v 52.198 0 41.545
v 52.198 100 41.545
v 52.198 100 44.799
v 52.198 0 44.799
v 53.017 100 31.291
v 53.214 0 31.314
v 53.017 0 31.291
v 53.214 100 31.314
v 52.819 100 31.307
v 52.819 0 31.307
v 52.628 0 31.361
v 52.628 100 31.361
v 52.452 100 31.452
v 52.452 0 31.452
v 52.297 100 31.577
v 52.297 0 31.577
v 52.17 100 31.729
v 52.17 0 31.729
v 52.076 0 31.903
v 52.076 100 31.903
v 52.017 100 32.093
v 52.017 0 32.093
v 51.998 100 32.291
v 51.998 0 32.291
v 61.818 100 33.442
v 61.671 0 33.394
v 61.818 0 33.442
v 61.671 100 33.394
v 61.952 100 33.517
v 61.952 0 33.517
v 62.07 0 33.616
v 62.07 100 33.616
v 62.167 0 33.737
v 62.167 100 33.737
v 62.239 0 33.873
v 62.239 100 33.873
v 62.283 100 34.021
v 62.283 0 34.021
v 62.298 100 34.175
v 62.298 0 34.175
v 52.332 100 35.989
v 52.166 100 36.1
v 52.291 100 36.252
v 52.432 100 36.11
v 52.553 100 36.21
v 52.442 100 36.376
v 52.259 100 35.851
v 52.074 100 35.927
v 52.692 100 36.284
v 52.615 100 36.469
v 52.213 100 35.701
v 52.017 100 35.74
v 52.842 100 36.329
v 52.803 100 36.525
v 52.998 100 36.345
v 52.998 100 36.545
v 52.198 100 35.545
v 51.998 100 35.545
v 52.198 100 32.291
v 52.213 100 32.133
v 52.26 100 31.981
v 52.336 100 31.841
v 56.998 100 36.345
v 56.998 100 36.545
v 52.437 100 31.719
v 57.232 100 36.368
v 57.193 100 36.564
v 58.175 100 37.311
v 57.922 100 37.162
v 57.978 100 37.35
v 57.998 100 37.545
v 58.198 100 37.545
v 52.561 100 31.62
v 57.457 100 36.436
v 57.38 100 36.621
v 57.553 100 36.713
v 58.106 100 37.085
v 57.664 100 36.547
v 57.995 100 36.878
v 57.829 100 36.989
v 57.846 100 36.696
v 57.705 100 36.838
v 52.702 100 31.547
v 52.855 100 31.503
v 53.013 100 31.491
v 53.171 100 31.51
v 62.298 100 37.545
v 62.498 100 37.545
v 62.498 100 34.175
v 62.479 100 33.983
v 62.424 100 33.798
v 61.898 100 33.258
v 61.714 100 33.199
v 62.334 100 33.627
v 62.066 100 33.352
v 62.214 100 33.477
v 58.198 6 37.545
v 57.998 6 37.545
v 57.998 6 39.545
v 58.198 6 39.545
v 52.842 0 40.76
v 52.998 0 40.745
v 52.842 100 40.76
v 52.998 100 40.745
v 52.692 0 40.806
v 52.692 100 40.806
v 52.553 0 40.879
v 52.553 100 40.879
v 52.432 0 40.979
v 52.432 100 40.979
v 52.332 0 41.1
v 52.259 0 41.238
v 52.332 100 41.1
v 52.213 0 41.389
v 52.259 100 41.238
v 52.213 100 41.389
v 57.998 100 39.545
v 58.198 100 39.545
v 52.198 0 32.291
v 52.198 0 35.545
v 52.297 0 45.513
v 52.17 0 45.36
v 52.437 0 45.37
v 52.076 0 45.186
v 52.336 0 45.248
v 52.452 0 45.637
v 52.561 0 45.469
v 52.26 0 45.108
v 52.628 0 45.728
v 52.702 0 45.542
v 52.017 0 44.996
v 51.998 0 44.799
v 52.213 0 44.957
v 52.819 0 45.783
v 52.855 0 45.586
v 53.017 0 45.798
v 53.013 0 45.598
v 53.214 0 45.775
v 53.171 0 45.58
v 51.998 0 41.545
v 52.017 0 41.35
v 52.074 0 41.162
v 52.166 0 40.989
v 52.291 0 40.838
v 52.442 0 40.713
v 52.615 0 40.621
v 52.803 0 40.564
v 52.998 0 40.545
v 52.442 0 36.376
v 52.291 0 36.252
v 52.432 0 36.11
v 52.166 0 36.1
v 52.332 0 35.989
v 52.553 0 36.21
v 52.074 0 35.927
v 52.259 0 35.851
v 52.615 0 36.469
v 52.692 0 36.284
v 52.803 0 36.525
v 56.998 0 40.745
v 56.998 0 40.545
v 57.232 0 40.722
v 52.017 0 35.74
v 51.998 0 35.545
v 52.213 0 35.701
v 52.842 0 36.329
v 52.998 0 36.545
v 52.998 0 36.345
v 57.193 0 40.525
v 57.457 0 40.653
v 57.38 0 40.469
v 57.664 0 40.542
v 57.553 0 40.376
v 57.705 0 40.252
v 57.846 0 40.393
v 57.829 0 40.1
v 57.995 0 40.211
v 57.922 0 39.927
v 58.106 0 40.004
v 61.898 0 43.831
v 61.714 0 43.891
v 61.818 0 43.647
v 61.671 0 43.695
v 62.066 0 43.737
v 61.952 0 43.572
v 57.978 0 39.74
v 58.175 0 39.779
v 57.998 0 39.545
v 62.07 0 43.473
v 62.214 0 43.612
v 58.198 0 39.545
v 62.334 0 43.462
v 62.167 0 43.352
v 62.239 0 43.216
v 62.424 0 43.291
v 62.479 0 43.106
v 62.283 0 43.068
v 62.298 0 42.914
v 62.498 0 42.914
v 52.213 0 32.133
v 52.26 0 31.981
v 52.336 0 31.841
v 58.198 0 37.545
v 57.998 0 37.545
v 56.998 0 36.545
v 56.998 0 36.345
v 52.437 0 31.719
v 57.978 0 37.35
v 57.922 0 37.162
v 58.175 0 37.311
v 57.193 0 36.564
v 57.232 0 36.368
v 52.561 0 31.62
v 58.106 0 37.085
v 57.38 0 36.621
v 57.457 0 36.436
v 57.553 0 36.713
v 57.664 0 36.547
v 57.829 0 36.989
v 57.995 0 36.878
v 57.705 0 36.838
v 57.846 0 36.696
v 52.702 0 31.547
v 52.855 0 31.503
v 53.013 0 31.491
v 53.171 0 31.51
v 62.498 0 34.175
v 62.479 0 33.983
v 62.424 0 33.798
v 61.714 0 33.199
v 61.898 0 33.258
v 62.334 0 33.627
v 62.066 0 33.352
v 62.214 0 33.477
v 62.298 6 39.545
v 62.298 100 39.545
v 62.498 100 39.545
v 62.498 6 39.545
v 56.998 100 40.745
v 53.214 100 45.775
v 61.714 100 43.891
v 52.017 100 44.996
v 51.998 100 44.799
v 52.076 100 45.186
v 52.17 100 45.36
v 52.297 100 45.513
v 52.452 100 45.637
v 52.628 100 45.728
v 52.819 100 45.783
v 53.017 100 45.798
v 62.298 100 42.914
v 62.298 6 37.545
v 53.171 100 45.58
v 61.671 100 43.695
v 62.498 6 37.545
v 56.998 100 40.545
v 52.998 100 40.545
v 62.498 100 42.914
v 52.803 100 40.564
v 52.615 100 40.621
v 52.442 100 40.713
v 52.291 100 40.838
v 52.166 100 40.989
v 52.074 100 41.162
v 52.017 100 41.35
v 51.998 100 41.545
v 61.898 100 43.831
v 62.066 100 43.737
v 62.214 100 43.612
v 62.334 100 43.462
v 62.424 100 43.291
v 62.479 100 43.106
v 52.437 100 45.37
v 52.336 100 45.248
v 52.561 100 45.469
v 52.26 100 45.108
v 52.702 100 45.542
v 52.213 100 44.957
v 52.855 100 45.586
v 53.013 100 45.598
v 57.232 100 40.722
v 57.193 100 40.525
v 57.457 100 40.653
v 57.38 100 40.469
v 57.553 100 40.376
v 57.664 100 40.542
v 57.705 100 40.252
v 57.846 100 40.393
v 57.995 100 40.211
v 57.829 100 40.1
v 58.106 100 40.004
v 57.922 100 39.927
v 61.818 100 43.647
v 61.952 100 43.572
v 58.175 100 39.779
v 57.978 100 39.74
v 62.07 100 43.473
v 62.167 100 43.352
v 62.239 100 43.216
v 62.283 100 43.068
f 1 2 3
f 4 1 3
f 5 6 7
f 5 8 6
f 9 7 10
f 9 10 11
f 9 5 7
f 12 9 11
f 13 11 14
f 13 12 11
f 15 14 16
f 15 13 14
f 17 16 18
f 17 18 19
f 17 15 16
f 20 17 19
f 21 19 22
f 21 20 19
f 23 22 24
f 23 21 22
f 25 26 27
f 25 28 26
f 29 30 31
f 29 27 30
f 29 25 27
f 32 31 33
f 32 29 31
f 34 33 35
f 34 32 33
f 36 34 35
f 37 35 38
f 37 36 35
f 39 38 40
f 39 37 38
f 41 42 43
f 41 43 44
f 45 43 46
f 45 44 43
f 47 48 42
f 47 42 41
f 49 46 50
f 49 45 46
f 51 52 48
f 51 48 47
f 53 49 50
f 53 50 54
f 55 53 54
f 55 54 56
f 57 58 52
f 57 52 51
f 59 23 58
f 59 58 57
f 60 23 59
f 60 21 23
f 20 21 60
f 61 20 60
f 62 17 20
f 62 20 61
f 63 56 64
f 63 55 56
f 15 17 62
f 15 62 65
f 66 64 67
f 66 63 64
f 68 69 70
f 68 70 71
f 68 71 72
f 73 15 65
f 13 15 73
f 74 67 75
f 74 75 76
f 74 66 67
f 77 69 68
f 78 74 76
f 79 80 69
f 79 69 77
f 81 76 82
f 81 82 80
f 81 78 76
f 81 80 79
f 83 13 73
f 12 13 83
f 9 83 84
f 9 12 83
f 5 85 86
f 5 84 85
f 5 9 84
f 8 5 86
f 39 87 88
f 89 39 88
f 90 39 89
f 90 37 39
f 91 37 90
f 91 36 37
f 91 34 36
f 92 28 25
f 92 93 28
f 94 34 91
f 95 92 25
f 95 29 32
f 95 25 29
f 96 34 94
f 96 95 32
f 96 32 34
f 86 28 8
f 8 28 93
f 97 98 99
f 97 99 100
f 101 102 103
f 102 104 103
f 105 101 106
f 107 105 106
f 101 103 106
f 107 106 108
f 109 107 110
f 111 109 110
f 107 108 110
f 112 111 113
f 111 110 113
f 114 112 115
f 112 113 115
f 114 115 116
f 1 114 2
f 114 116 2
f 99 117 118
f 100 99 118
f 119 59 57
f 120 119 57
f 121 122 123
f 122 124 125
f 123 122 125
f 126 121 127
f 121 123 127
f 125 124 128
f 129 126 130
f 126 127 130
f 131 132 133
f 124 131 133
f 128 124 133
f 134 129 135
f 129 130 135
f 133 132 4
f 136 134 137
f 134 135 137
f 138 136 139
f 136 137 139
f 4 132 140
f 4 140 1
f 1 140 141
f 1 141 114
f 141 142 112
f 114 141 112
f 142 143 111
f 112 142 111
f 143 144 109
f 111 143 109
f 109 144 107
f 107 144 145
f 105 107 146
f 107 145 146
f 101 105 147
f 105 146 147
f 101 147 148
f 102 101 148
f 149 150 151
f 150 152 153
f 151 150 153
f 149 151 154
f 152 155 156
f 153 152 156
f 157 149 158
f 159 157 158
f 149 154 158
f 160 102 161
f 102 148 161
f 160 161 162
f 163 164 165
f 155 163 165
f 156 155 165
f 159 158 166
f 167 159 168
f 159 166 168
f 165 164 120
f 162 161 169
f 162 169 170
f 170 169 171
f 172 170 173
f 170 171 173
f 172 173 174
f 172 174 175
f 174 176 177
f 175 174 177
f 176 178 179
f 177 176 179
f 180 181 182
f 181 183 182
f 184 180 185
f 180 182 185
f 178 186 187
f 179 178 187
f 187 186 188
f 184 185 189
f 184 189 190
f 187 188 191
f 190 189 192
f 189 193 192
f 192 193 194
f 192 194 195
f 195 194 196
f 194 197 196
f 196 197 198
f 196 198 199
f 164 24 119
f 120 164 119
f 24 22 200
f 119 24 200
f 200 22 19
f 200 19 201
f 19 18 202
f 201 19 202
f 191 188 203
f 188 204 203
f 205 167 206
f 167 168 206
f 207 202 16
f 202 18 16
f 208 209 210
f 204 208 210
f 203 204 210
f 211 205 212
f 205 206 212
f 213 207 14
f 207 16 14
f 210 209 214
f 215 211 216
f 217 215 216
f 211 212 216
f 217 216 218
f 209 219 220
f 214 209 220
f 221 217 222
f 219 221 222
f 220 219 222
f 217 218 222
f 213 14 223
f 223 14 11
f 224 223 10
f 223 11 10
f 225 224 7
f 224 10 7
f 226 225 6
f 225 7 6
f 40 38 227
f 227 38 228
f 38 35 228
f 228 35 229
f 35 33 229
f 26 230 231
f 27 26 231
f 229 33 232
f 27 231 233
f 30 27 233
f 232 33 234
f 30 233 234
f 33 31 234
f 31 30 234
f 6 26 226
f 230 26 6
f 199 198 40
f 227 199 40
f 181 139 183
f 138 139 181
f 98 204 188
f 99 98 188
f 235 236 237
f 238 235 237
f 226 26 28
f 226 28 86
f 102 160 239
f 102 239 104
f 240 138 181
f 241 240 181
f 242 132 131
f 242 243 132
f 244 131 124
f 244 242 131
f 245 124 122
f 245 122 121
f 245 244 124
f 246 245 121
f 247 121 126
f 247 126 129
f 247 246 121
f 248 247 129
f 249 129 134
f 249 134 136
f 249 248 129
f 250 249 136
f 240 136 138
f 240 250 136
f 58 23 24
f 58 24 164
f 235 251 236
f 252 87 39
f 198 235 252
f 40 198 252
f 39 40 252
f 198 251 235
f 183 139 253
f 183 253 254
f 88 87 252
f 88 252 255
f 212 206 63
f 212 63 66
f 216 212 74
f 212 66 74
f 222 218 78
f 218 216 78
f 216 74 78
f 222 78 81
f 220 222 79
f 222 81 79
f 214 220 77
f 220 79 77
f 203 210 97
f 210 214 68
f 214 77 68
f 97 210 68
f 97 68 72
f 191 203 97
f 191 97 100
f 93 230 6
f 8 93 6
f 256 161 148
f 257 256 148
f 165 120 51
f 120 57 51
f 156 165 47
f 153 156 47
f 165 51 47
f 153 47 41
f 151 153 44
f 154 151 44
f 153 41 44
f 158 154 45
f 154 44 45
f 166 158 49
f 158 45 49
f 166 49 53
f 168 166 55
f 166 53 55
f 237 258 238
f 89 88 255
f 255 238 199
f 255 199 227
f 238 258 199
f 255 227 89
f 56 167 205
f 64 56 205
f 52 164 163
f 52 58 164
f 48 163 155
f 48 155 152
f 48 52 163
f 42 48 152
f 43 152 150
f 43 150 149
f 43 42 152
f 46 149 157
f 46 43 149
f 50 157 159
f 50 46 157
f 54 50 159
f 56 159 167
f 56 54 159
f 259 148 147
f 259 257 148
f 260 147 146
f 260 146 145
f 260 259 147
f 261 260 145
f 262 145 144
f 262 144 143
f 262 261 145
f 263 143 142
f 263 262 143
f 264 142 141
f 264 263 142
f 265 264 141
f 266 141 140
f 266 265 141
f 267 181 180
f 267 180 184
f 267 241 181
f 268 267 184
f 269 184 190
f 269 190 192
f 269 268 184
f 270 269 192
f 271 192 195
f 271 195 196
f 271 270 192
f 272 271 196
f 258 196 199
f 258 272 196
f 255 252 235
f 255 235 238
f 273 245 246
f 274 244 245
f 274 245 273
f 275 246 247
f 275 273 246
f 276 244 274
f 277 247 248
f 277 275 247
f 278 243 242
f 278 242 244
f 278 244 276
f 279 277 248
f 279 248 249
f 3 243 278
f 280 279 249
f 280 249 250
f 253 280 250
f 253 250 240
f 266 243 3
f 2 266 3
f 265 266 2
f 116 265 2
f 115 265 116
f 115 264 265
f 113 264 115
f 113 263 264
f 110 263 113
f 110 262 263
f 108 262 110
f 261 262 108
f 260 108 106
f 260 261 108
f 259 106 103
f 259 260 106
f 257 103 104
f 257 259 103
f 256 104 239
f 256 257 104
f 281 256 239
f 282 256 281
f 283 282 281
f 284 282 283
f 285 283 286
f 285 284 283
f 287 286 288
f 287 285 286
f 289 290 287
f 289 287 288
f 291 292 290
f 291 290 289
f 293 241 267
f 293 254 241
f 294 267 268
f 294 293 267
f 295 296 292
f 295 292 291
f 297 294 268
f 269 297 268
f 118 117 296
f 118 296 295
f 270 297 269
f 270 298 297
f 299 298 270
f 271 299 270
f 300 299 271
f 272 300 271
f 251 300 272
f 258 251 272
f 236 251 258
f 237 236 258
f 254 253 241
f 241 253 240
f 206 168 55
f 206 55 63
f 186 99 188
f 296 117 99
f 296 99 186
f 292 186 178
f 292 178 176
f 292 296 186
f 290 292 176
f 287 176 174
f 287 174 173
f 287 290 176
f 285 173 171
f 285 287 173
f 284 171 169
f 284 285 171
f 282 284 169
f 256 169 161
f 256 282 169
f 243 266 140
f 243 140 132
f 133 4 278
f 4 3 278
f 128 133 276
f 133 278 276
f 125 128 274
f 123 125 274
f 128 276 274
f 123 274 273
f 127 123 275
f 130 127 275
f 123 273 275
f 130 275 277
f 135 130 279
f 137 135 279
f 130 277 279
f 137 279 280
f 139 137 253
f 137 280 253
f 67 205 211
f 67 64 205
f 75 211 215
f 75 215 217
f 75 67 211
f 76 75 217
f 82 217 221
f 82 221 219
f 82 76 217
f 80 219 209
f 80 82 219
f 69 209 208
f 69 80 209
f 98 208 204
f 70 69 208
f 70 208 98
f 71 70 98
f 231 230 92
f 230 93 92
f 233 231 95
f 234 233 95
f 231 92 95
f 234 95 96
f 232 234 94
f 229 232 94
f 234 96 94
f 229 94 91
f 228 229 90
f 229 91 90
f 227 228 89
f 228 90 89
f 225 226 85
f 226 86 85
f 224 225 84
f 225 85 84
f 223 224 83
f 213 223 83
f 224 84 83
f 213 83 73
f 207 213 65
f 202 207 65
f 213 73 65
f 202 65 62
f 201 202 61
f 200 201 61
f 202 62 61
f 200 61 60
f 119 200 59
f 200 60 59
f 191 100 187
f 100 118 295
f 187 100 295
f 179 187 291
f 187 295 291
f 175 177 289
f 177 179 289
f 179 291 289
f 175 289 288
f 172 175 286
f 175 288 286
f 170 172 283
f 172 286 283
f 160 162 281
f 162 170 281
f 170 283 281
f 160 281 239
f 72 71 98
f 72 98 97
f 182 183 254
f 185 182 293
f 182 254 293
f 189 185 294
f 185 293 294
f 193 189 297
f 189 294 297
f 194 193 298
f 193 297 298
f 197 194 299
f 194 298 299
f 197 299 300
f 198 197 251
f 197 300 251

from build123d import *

# Parameters (mm, degrees)
BOSS_EXTRUDE1_DEPTH = 100
FILLET1_R           = 1
SHELL3_T            = -0.2
SKETCH2_W           = 5.995745437
SKETCH2_H           = 2
CUT_EXTRUDE1_DEPTH  = 94


with BuildPart() as part:
    # Sketch1 → Boss-Extrude1 (new body)
    with BuildSketch(Plane(origin=(0, 0, 0), x_dir=(1, 0, 0), z_dir=(0, 1, 0))):
        Polygon((62.497660956, -33.372417048), (51.997660956, -31.04462309), (51.997660956, -36.54462309), (57.997660956, -36.54462309), (57.997660956, -40.54462309), (51.997660956, -40.54462309), (51.997660956, -46.04462309), (62.497660956, -43.716829132), align=None)
    extrude(amount=BOSS_EXTRUDE1_DEPTH)

    # Fillet1
    fillet1_edges = [part.edges().sort_by_distance(p)[0] for p in [
        (62.497660956, 50, 43.716829132),
        (51.997660956, 50, 46.04462309),
        (51.997660956, 50, 40.54462309),
        (57.997660956, 50, 40.54462309),
        (57.997660956, 50, 36.54462309),
        (51.997660956, 50, 36.54462309),
        (51.997660956, 50, 31.04462309),
        (62.497660956, 50, 33.372417048),
    ]]
    fillet(fillet1_edges, radius=FILLET1_R)

    # Shell3
    shell3_openings = [part.faces().sort_by_distance(p)[0] for p in [
        (57.425338322, 100, 32.431348777),
        (57.425338322, 0, 32.431348777),
    ]]
    offset(amount=SHELL3_T, openings=shell3_openings, kind=Kind.INTERSECTION)

    # Sketch2 → Cut-Extrude1 (cut)
    with BuildSketch(Plane(origin=(0, 100, 0), x_dir=(1, 0, 0), z_dir=(0, 1, 0))):
        with Locations((60.442884904, -38.54462309)):
            Rectangle(SKETCH2_W, SKETCH2_H)
    extrude(amount=-CUT_EXTRUDE1_DEPTH, mode=Mode.SUBTRACT)


solid = part.part
